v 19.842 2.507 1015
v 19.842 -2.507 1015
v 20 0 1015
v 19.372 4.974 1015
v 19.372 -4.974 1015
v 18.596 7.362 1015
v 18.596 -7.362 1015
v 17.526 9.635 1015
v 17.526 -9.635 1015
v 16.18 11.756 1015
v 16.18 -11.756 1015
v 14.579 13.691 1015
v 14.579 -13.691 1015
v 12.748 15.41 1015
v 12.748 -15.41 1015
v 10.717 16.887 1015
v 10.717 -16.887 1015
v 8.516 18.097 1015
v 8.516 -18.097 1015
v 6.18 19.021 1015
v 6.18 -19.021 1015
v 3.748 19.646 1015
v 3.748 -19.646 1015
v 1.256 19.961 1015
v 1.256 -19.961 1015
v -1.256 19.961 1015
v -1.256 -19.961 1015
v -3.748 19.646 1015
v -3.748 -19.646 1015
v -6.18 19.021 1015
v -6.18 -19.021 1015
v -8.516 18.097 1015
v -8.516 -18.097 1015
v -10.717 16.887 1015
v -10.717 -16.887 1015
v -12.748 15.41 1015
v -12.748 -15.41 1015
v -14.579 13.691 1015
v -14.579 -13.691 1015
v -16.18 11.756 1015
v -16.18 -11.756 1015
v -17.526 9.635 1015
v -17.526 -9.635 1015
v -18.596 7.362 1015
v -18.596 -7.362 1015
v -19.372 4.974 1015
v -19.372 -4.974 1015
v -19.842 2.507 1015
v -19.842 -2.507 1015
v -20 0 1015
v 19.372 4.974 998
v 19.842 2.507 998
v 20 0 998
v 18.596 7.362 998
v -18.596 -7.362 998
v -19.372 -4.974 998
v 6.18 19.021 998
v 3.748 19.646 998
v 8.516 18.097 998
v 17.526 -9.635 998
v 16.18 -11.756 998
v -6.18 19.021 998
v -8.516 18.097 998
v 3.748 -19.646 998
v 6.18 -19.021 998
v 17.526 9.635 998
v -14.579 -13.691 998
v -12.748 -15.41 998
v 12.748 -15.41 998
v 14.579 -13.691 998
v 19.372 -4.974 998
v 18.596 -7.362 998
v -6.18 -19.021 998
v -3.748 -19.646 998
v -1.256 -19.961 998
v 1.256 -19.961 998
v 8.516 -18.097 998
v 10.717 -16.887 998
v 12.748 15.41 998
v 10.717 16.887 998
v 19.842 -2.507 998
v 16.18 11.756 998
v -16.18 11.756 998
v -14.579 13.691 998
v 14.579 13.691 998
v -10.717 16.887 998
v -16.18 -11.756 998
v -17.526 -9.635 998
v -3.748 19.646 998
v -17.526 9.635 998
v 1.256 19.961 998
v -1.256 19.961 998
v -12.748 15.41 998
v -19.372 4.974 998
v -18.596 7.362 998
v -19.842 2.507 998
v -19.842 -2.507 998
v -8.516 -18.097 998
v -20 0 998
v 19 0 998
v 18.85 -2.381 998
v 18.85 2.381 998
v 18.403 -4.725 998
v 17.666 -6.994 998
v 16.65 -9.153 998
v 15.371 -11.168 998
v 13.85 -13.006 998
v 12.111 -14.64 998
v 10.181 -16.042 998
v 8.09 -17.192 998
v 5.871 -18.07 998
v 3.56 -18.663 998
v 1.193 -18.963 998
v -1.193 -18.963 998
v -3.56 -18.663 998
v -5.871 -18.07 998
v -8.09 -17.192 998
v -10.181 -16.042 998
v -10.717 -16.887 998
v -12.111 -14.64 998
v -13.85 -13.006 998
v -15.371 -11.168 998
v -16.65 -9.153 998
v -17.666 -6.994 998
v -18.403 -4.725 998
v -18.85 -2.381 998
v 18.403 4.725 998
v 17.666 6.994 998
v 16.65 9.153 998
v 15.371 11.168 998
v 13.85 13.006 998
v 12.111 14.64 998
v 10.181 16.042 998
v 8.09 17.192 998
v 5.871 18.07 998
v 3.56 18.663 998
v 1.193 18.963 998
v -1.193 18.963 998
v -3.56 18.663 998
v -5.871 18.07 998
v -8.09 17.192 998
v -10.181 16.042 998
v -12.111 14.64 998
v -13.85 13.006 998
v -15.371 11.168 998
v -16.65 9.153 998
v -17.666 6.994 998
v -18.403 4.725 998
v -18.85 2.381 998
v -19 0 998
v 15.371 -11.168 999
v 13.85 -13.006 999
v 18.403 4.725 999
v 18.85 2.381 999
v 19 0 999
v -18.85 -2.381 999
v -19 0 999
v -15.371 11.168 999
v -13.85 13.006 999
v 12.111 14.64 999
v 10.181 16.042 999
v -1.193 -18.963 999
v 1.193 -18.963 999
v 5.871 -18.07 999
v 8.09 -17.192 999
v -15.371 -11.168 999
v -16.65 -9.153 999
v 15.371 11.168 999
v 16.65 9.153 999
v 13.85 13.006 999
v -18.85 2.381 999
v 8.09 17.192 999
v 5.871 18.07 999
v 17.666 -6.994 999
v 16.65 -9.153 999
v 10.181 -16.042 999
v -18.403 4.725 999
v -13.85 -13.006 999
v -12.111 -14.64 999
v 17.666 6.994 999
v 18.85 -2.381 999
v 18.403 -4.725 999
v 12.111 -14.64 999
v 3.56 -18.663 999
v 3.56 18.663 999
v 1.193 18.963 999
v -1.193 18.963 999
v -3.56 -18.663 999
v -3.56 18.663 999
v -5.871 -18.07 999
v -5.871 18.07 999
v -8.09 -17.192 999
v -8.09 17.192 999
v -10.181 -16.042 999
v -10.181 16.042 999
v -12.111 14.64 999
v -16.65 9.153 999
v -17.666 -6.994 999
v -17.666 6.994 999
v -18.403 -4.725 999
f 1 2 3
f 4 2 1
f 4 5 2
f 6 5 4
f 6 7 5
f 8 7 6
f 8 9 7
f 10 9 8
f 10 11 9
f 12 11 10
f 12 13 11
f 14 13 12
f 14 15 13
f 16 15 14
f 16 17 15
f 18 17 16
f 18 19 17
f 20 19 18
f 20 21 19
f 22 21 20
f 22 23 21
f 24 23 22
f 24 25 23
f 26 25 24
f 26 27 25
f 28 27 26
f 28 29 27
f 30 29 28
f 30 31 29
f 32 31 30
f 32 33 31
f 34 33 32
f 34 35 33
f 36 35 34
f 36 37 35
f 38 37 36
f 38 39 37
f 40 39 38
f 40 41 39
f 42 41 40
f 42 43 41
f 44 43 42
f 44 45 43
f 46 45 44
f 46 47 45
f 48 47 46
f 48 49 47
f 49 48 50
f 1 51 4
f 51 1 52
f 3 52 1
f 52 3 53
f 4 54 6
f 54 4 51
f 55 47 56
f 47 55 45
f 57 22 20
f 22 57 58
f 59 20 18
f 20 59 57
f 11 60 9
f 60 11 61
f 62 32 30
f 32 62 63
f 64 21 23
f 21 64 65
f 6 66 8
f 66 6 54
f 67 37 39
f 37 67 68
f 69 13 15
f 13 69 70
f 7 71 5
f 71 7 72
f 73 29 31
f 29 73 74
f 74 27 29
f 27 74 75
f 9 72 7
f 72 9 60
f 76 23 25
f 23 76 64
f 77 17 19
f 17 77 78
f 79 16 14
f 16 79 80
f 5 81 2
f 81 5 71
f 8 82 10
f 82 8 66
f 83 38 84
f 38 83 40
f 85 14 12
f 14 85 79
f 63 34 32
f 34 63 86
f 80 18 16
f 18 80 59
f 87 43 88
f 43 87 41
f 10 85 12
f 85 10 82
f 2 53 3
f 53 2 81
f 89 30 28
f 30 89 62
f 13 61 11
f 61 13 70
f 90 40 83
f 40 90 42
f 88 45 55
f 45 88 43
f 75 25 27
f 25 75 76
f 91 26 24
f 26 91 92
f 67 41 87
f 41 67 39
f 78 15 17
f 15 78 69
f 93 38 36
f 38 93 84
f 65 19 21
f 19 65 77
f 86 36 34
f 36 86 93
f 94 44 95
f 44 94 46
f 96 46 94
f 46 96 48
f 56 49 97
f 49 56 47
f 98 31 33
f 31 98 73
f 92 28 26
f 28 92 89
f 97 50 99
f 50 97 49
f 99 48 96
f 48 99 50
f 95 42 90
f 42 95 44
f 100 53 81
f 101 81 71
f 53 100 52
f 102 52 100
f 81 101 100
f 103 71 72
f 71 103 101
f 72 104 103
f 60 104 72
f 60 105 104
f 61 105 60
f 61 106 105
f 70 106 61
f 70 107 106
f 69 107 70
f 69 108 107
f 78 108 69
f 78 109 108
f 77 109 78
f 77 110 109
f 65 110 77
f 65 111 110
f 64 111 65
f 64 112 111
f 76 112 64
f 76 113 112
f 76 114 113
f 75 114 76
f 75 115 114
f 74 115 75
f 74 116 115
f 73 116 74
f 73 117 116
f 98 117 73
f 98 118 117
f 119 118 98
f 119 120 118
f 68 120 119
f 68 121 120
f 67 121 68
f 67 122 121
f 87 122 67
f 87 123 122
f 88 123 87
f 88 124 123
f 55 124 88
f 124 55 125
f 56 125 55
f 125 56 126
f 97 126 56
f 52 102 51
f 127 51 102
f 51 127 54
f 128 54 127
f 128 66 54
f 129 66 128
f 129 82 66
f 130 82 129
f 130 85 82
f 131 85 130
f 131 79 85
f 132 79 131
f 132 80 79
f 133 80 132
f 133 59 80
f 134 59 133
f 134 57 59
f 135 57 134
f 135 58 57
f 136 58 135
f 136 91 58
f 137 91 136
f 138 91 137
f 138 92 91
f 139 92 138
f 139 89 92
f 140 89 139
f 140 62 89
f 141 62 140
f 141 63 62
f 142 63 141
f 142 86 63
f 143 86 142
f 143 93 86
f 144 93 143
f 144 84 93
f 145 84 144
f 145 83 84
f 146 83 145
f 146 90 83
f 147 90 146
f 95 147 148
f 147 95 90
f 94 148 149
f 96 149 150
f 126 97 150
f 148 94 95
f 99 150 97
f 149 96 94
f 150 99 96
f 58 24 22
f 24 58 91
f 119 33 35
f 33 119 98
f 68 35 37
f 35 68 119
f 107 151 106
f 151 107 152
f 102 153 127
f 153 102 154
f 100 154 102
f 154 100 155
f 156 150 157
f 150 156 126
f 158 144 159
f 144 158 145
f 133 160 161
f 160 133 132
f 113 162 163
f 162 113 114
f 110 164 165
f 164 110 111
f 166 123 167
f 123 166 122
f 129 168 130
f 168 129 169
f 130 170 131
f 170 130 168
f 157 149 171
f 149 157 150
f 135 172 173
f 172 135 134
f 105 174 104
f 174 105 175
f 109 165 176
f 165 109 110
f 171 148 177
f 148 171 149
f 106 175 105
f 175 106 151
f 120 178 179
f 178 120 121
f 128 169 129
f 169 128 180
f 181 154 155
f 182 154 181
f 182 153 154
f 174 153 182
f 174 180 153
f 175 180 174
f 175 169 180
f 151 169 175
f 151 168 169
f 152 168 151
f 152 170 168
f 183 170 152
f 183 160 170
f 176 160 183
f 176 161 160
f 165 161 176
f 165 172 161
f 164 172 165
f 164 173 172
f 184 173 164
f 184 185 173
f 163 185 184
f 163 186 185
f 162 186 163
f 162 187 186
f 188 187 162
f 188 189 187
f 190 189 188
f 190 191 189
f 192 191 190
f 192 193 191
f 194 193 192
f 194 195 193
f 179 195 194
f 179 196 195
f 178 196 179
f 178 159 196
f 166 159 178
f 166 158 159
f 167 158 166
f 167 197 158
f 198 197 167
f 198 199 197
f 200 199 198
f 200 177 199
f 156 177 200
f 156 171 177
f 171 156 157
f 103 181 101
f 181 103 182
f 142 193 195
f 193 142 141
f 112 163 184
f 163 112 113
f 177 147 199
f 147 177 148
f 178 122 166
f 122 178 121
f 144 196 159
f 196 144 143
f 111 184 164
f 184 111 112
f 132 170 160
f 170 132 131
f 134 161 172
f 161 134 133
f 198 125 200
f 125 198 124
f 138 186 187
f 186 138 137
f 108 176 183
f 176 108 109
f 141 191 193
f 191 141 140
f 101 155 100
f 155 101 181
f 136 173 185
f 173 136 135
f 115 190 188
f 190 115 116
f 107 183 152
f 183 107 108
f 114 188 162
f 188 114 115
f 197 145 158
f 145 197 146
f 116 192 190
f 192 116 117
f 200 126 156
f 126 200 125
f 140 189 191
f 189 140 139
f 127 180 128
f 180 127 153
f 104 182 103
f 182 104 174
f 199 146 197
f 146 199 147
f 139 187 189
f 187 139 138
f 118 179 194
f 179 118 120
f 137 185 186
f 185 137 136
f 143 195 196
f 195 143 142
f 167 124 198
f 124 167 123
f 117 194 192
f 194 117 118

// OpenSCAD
 difference(){
//translate([0,0,-2])linear_extrude(17)circle(20, $fn = 50);
//translate([0,0,-2])linear_extrude(1)circle(19, $fn = 50);
        translate([0,0,998])cylinder(h=17, r=20, $fn = 50);
        translate([0,0,998])cylinder(h=1, r=19, $fn = 50);
    }
